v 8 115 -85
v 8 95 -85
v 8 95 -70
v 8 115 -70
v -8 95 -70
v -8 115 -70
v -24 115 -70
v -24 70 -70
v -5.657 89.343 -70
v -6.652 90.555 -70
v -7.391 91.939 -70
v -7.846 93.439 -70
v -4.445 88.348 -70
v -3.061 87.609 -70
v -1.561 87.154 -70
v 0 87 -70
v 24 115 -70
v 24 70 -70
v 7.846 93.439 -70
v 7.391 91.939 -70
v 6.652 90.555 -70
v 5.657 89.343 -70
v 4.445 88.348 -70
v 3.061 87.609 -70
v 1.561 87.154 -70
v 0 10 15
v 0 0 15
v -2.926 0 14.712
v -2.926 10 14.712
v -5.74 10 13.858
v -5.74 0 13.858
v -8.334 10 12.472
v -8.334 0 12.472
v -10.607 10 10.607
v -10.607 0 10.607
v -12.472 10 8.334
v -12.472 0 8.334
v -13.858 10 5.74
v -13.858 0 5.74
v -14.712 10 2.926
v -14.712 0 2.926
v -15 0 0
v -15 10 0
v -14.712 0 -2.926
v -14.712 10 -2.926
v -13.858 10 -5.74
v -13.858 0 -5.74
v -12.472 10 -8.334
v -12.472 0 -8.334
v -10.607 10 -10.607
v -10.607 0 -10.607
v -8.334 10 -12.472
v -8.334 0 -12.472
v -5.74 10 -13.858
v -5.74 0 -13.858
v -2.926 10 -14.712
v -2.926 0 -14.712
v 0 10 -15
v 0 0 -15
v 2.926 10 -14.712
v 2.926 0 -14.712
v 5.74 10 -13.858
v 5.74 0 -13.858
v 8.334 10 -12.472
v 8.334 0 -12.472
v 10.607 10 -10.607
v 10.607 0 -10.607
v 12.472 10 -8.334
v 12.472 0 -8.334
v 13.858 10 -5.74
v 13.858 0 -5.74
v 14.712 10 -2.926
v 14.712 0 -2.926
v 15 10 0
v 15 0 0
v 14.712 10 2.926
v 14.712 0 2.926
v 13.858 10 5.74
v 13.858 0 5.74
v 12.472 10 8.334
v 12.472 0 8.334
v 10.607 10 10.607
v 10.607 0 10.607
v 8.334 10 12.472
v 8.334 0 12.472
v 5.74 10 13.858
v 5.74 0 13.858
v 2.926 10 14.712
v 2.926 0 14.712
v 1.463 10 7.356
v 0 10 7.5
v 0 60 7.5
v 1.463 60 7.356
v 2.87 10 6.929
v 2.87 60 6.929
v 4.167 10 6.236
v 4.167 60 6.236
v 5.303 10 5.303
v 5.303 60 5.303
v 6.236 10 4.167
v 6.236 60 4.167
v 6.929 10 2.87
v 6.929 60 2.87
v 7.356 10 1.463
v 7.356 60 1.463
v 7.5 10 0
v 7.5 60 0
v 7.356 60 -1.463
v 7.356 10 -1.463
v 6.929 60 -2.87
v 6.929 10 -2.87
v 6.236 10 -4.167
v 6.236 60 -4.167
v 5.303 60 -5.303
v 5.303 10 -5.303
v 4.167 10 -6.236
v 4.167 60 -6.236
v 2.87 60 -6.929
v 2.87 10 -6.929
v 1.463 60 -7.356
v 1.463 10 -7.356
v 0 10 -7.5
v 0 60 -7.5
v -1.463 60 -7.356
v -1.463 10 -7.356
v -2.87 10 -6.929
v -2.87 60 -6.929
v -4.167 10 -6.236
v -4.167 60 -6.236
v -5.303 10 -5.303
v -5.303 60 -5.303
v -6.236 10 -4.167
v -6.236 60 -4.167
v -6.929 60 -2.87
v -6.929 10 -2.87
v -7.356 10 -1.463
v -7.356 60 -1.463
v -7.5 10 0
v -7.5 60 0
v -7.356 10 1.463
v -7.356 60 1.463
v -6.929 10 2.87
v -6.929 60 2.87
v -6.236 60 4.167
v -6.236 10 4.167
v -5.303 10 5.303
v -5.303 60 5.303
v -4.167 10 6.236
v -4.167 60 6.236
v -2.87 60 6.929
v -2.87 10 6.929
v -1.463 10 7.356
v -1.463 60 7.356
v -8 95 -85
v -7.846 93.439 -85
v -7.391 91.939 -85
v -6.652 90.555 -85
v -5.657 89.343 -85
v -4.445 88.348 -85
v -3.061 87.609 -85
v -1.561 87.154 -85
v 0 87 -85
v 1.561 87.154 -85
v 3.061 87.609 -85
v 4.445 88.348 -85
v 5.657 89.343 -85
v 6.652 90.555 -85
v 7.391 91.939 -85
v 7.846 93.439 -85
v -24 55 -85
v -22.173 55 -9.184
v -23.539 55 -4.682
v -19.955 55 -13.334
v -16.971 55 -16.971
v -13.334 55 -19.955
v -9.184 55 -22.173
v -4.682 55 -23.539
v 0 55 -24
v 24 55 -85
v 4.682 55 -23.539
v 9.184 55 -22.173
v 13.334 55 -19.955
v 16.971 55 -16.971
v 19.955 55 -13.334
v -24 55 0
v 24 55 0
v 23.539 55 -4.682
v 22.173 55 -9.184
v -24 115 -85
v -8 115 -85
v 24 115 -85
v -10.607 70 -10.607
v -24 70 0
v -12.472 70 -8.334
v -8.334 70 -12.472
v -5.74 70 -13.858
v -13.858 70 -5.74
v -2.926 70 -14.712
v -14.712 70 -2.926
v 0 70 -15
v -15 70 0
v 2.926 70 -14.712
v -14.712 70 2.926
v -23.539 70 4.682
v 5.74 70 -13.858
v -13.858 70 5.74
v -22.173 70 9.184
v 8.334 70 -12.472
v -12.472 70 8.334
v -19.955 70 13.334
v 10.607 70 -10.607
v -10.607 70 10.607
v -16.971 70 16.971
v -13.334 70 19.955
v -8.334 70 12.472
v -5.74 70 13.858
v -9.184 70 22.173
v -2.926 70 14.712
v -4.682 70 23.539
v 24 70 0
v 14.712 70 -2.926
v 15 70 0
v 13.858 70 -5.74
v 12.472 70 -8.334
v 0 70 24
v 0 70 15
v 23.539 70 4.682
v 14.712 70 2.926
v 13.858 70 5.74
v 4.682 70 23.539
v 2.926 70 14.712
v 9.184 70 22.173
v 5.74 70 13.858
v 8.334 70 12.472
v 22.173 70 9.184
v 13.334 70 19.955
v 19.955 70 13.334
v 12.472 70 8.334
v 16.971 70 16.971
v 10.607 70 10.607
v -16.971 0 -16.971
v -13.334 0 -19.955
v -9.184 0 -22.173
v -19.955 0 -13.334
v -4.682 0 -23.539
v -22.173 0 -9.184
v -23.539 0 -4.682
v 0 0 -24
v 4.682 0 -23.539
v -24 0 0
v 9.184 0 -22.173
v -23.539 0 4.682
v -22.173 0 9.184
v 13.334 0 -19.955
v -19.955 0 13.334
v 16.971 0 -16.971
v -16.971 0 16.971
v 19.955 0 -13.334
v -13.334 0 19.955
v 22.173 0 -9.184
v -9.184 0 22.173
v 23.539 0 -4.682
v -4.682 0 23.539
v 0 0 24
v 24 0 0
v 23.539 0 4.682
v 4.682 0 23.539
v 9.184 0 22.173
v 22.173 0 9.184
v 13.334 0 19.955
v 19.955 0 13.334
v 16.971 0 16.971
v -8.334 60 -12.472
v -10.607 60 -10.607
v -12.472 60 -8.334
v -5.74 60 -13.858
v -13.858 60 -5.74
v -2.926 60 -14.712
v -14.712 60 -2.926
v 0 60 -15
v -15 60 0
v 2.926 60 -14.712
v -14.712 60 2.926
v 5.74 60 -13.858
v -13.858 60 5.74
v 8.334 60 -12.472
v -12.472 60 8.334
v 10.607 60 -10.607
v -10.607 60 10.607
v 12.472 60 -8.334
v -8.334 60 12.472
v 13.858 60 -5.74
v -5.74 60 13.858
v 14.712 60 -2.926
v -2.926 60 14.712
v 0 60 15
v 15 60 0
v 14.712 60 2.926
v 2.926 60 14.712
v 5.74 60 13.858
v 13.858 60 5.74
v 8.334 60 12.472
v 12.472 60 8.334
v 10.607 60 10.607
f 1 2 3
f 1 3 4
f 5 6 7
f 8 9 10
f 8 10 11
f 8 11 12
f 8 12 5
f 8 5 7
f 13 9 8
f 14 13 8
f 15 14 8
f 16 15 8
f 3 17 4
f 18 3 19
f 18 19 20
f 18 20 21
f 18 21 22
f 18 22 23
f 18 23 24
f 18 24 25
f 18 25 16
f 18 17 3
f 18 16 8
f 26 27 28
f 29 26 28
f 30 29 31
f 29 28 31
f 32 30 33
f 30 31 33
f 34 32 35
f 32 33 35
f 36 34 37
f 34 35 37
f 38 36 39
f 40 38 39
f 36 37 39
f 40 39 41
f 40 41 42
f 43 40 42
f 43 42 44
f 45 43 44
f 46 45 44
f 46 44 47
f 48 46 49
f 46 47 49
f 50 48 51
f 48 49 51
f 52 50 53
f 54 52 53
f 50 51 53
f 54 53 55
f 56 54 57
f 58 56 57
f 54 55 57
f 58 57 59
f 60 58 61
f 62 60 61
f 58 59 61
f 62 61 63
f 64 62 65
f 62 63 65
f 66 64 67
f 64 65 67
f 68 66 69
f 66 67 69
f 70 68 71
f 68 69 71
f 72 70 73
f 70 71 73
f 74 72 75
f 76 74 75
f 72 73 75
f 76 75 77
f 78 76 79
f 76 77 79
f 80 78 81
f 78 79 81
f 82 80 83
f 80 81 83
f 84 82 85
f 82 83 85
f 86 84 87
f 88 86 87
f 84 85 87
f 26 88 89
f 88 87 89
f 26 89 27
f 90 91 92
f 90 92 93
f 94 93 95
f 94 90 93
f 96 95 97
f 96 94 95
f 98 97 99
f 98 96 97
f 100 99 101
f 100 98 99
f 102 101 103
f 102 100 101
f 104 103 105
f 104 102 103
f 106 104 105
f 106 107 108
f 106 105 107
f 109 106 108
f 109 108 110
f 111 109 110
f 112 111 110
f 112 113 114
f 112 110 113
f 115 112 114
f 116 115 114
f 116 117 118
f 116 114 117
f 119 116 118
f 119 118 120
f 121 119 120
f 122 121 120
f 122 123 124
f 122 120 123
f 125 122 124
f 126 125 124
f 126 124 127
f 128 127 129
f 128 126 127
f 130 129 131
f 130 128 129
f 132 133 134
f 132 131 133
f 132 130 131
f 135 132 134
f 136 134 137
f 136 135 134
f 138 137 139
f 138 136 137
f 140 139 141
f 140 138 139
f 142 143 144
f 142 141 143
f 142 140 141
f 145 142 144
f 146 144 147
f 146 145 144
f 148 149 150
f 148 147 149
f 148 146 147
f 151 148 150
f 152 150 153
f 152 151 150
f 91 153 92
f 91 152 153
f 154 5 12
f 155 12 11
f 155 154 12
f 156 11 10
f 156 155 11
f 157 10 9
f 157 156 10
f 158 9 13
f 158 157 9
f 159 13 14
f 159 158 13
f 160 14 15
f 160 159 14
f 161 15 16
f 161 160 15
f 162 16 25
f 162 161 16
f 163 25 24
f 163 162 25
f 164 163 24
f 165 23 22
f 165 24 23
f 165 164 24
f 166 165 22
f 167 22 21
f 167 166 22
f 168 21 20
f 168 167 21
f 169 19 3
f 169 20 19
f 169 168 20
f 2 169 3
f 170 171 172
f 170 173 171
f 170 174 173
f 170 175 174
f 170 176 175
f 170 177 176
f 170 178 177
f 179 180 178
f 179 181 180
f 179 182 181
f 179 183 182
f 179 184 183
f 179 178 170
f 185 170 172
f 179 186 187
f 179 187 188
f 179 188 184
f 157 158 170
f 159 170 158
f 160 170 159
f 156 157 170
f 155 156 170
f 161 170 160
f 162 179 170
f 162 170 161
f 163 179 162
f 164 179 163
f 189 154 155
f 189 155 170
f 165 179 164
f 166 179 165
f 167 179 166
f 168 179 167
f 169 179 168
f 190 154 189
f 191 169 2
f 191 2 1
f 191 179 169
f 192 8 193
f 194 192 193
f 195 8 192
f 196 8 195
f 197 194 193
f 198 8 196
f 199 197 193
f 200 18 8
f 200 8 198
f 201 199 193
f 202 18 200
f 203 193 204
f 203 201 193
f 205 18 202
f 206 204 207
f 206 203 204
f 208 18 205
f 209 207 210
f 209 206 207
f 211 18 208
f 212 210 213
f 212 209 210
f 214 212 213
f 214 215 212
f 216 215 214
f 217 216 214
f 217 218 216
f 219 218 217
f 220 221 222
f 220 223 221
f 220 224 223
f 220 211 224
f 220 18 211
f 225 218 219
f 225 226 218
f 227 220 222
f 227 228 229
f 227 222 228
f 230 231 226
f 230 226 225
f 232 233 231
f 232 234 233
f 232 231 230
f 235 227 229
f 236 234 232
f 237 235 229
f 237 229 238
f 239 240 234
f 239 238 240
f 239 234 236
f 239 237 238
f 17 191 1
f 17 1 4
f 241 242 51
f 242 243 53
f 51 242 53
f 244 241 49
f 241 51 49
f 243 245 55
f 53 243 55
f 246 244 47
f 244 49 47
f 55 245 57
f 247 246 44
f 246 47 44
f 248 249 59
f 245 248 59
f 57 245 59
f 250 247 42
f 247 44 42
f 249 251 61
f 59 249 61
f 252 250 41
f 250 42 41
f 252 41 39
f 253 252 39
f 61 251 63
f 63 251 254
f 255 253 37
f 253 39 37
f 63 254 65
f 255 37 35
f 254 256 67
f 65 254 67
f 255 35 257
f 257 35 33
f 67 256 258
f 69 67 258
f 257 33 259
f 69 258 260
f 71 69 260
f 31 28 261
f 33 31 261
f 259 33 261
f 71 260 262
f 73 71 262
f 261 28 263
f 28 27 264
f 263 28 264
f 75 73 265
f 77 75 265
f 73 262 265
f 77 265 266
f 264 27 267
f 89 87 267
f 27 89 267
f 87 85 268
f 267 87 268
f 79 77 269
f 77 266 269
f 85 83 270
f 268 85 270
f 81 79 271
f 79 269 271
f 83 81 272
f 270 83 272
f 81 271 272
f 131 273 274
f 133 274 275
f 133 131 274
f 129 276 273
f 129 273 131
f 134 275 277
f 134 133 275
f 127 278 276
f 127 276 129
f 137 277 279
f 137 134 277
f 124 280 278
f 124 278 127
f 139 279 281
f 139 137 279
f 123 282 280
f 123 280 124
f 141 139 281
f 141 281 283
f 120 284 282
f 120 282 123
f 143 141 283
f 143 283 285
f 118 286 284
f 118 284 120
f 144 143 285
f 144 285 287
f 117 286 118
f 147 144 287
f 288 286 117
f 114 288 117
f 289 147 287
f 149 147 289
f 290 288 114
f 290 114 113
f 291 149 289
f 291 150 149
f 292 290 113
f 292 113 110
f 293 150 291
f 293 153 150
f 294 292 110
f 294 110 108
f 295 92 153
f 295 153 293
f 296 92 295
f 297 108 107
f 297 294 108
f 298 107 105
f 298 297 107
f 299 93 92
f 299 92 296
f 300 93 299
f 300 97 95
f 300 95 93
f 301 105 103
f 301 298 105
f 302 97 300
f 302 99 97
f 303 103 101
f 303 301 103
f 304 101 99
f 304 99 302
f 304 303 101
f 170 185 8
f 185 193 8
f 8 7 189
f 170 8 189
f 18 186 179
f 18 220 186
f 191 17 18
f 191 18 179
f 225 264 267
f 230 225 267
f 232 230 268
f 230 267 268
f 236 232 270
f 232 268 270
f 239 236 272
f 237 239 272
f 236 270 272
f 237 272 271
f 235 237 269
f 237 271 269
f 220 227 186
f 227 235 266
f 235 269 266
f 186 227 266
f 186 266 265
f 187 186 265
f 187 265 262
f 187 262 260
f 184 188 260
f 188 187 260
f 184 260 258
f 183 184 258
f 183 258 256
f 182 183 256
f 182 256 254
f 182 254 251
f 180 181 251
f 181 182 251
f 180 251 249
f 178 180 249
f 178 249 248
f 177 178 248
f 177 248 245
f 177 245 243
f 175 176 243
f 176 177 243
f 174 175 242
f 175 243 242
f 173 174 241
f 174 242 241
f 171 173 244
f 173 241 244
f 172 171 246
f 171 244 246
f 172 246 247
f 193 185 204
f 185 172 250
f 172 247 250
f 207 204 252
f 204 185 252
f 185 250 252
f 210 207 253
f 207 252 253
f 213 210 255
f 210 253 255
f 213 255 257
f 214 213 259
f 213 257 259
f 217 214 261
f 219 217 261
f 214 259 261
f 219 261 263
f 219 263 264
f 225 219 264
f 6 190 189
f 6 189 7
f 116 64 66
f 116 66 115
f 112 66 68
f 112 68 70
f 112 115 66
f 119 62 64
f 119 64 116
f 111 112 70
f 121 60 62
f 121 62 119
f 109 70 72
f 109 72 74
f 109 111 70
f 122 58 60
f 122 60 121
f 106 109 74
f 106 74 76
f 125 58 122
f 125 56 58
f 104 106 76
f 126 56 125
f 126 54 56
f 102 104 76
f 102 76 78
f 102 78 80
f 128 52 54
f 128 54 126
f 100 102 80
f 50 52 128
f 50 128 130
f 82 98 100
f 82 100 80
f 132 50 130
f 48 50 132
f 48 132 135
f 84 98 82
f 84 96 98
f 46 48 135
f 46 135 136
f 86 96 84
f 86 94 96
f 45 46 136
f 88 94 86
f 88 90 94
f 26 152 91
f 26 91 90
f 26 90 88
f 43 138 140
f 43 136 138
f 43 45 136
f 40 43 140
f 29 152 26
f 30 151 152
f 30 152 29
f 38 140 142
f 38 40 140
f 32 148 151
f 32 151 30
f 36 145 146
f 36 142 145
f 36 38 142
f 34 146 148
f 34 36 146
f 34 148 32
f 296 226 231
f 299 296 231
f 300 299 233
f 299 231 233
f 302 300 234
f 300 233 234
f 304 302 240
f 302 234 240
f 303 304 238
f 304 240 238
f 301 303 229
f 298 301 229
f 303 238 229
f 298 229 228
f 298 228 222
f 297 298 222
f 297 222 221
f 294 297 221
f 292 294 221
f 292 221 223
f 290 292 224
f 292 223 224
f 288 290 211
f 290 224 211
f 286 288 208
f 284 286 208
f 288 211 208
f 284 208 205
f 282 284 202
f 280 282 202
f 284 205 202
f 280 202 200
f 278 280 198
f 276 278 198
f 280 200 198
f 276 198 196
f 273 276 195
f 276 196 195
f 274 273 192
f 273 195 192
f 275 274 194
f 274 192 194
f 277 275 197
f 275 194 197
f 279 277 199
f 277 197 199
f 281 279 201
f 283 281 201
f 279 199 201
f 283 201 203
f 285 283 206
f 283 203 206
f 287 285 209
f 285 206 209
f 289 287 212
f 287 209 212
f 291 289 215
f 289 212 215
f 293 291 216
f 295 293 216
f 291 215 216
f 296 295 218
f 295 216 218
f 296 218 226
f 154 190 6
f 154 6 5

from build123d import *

# Parameters (mm, degrees)
SKETCH1_R           = 24
SKETCH1_R_2         = 7.5
BOSS_EXTRUDE1_DEPTH = 70
BOSS_EXTRUDE3_DEPTH = 24
SKETCH3_R           = 7.5
CUT_EXTRUDE1_DEPTH  = 48
SKETCH4_R           = 15
CUT_EXTRUDE2_DEPTH  = 10
SKETCH5_R           = 15
CUT_EXTRUDE3_DEPTH  = 10
CUT_EXTRUDE4_DEPTH  = 20


with BuildPart() as part:
    # Sketch1 → Boss-Extrude1 (new body)
    with BuildSketch(Plane(origin=(0, 0, 0), x_dir=(1, 0, 0), z_dir=(0, 1, 0))):
        with Locations(Location((0, 0, 0), (0, 0, 270))):
            Circle(SKETCH1_R)
        with Locations(Location((0, 0, 0), (0, 0, 270))):
            Circle(SKETCH1_R_2, mode=Mode.SUBTRACT)
    extrude(amount=BOSS_EXTRUDE1_DEPTH)

    # Sketch2 → Boss-Extrude3 (add, symmetric)
    with BuildSketch(Plane(origin=(0, 0, 0), x_dir=(0, 0, -1), z_dir=(1, 0, 0))):
        Polygon((0, 55), (85, 55), (85, 115), (70, 115), (70, 70), (0, 70), align=None)
    extrude(amount=BOSS_EXTRUDE3_DEPTH, both=True)

    # Sketch3 → Cut-Extrude1 (cut)
    with BuildSketch(Plane(origin=(0, 55, 0), x_dir=(-1, 0, 0), z_dir=(0, -1, 0))):
        with Locations(Location((0, 0, 0), (0, 0, 270))):
            Circle(SKETCH3_R)
    extrude(amount=-CUT_EXTRUDE1_DEPTH, mode=Mode.SUBTRACT)

    # Sketch4 → Cut-Extrude2 (cut)
    with BuildSketch(Plane(origin=(0, 70, 0), x_dir=(1, 0, 0), z_dir=(0, 1, 0))):
        with Locations(Location((0, 0, 0), (0, 0, 270))):
            Circle(SKETCH4_R)
    extrude(amount=-CUT_EXTRUDE2_DEPTH, mode=Mode.SUBTRACT)

    # Sketch5 → Cut-Extrude3 (cut)
    with BuildSketch(Plane.XZ):
        with Locations(Location((0, 0, 0), (0, 0, 90))):
            Circle(SKETCH5_R)
    extrude(amount=-CUT_EXTRUDE3_DEPTH, mode=Mode.SUBTRACT)

    # Sketch6 → Cut-Extrude4 (cut)
    with BuildSketch(Plane(origin=(0, 0, -85), x_dir=(-1, 0, 0), z_dir=(0, 0, -1))):
        with BuildLine():
            Line((-8, 95), (-8, 115))
            Line((-8, 115), (8, 115))
            Line((8, 115), (8, 95))
            ThreePointArc((8, 95), (0, 87), (-8, 95))
        make_face()
    extrude(amount=-CUT_EXTRUDE4_DEPTH, mode=Mode.SUBTRACT)


solid = part.part
